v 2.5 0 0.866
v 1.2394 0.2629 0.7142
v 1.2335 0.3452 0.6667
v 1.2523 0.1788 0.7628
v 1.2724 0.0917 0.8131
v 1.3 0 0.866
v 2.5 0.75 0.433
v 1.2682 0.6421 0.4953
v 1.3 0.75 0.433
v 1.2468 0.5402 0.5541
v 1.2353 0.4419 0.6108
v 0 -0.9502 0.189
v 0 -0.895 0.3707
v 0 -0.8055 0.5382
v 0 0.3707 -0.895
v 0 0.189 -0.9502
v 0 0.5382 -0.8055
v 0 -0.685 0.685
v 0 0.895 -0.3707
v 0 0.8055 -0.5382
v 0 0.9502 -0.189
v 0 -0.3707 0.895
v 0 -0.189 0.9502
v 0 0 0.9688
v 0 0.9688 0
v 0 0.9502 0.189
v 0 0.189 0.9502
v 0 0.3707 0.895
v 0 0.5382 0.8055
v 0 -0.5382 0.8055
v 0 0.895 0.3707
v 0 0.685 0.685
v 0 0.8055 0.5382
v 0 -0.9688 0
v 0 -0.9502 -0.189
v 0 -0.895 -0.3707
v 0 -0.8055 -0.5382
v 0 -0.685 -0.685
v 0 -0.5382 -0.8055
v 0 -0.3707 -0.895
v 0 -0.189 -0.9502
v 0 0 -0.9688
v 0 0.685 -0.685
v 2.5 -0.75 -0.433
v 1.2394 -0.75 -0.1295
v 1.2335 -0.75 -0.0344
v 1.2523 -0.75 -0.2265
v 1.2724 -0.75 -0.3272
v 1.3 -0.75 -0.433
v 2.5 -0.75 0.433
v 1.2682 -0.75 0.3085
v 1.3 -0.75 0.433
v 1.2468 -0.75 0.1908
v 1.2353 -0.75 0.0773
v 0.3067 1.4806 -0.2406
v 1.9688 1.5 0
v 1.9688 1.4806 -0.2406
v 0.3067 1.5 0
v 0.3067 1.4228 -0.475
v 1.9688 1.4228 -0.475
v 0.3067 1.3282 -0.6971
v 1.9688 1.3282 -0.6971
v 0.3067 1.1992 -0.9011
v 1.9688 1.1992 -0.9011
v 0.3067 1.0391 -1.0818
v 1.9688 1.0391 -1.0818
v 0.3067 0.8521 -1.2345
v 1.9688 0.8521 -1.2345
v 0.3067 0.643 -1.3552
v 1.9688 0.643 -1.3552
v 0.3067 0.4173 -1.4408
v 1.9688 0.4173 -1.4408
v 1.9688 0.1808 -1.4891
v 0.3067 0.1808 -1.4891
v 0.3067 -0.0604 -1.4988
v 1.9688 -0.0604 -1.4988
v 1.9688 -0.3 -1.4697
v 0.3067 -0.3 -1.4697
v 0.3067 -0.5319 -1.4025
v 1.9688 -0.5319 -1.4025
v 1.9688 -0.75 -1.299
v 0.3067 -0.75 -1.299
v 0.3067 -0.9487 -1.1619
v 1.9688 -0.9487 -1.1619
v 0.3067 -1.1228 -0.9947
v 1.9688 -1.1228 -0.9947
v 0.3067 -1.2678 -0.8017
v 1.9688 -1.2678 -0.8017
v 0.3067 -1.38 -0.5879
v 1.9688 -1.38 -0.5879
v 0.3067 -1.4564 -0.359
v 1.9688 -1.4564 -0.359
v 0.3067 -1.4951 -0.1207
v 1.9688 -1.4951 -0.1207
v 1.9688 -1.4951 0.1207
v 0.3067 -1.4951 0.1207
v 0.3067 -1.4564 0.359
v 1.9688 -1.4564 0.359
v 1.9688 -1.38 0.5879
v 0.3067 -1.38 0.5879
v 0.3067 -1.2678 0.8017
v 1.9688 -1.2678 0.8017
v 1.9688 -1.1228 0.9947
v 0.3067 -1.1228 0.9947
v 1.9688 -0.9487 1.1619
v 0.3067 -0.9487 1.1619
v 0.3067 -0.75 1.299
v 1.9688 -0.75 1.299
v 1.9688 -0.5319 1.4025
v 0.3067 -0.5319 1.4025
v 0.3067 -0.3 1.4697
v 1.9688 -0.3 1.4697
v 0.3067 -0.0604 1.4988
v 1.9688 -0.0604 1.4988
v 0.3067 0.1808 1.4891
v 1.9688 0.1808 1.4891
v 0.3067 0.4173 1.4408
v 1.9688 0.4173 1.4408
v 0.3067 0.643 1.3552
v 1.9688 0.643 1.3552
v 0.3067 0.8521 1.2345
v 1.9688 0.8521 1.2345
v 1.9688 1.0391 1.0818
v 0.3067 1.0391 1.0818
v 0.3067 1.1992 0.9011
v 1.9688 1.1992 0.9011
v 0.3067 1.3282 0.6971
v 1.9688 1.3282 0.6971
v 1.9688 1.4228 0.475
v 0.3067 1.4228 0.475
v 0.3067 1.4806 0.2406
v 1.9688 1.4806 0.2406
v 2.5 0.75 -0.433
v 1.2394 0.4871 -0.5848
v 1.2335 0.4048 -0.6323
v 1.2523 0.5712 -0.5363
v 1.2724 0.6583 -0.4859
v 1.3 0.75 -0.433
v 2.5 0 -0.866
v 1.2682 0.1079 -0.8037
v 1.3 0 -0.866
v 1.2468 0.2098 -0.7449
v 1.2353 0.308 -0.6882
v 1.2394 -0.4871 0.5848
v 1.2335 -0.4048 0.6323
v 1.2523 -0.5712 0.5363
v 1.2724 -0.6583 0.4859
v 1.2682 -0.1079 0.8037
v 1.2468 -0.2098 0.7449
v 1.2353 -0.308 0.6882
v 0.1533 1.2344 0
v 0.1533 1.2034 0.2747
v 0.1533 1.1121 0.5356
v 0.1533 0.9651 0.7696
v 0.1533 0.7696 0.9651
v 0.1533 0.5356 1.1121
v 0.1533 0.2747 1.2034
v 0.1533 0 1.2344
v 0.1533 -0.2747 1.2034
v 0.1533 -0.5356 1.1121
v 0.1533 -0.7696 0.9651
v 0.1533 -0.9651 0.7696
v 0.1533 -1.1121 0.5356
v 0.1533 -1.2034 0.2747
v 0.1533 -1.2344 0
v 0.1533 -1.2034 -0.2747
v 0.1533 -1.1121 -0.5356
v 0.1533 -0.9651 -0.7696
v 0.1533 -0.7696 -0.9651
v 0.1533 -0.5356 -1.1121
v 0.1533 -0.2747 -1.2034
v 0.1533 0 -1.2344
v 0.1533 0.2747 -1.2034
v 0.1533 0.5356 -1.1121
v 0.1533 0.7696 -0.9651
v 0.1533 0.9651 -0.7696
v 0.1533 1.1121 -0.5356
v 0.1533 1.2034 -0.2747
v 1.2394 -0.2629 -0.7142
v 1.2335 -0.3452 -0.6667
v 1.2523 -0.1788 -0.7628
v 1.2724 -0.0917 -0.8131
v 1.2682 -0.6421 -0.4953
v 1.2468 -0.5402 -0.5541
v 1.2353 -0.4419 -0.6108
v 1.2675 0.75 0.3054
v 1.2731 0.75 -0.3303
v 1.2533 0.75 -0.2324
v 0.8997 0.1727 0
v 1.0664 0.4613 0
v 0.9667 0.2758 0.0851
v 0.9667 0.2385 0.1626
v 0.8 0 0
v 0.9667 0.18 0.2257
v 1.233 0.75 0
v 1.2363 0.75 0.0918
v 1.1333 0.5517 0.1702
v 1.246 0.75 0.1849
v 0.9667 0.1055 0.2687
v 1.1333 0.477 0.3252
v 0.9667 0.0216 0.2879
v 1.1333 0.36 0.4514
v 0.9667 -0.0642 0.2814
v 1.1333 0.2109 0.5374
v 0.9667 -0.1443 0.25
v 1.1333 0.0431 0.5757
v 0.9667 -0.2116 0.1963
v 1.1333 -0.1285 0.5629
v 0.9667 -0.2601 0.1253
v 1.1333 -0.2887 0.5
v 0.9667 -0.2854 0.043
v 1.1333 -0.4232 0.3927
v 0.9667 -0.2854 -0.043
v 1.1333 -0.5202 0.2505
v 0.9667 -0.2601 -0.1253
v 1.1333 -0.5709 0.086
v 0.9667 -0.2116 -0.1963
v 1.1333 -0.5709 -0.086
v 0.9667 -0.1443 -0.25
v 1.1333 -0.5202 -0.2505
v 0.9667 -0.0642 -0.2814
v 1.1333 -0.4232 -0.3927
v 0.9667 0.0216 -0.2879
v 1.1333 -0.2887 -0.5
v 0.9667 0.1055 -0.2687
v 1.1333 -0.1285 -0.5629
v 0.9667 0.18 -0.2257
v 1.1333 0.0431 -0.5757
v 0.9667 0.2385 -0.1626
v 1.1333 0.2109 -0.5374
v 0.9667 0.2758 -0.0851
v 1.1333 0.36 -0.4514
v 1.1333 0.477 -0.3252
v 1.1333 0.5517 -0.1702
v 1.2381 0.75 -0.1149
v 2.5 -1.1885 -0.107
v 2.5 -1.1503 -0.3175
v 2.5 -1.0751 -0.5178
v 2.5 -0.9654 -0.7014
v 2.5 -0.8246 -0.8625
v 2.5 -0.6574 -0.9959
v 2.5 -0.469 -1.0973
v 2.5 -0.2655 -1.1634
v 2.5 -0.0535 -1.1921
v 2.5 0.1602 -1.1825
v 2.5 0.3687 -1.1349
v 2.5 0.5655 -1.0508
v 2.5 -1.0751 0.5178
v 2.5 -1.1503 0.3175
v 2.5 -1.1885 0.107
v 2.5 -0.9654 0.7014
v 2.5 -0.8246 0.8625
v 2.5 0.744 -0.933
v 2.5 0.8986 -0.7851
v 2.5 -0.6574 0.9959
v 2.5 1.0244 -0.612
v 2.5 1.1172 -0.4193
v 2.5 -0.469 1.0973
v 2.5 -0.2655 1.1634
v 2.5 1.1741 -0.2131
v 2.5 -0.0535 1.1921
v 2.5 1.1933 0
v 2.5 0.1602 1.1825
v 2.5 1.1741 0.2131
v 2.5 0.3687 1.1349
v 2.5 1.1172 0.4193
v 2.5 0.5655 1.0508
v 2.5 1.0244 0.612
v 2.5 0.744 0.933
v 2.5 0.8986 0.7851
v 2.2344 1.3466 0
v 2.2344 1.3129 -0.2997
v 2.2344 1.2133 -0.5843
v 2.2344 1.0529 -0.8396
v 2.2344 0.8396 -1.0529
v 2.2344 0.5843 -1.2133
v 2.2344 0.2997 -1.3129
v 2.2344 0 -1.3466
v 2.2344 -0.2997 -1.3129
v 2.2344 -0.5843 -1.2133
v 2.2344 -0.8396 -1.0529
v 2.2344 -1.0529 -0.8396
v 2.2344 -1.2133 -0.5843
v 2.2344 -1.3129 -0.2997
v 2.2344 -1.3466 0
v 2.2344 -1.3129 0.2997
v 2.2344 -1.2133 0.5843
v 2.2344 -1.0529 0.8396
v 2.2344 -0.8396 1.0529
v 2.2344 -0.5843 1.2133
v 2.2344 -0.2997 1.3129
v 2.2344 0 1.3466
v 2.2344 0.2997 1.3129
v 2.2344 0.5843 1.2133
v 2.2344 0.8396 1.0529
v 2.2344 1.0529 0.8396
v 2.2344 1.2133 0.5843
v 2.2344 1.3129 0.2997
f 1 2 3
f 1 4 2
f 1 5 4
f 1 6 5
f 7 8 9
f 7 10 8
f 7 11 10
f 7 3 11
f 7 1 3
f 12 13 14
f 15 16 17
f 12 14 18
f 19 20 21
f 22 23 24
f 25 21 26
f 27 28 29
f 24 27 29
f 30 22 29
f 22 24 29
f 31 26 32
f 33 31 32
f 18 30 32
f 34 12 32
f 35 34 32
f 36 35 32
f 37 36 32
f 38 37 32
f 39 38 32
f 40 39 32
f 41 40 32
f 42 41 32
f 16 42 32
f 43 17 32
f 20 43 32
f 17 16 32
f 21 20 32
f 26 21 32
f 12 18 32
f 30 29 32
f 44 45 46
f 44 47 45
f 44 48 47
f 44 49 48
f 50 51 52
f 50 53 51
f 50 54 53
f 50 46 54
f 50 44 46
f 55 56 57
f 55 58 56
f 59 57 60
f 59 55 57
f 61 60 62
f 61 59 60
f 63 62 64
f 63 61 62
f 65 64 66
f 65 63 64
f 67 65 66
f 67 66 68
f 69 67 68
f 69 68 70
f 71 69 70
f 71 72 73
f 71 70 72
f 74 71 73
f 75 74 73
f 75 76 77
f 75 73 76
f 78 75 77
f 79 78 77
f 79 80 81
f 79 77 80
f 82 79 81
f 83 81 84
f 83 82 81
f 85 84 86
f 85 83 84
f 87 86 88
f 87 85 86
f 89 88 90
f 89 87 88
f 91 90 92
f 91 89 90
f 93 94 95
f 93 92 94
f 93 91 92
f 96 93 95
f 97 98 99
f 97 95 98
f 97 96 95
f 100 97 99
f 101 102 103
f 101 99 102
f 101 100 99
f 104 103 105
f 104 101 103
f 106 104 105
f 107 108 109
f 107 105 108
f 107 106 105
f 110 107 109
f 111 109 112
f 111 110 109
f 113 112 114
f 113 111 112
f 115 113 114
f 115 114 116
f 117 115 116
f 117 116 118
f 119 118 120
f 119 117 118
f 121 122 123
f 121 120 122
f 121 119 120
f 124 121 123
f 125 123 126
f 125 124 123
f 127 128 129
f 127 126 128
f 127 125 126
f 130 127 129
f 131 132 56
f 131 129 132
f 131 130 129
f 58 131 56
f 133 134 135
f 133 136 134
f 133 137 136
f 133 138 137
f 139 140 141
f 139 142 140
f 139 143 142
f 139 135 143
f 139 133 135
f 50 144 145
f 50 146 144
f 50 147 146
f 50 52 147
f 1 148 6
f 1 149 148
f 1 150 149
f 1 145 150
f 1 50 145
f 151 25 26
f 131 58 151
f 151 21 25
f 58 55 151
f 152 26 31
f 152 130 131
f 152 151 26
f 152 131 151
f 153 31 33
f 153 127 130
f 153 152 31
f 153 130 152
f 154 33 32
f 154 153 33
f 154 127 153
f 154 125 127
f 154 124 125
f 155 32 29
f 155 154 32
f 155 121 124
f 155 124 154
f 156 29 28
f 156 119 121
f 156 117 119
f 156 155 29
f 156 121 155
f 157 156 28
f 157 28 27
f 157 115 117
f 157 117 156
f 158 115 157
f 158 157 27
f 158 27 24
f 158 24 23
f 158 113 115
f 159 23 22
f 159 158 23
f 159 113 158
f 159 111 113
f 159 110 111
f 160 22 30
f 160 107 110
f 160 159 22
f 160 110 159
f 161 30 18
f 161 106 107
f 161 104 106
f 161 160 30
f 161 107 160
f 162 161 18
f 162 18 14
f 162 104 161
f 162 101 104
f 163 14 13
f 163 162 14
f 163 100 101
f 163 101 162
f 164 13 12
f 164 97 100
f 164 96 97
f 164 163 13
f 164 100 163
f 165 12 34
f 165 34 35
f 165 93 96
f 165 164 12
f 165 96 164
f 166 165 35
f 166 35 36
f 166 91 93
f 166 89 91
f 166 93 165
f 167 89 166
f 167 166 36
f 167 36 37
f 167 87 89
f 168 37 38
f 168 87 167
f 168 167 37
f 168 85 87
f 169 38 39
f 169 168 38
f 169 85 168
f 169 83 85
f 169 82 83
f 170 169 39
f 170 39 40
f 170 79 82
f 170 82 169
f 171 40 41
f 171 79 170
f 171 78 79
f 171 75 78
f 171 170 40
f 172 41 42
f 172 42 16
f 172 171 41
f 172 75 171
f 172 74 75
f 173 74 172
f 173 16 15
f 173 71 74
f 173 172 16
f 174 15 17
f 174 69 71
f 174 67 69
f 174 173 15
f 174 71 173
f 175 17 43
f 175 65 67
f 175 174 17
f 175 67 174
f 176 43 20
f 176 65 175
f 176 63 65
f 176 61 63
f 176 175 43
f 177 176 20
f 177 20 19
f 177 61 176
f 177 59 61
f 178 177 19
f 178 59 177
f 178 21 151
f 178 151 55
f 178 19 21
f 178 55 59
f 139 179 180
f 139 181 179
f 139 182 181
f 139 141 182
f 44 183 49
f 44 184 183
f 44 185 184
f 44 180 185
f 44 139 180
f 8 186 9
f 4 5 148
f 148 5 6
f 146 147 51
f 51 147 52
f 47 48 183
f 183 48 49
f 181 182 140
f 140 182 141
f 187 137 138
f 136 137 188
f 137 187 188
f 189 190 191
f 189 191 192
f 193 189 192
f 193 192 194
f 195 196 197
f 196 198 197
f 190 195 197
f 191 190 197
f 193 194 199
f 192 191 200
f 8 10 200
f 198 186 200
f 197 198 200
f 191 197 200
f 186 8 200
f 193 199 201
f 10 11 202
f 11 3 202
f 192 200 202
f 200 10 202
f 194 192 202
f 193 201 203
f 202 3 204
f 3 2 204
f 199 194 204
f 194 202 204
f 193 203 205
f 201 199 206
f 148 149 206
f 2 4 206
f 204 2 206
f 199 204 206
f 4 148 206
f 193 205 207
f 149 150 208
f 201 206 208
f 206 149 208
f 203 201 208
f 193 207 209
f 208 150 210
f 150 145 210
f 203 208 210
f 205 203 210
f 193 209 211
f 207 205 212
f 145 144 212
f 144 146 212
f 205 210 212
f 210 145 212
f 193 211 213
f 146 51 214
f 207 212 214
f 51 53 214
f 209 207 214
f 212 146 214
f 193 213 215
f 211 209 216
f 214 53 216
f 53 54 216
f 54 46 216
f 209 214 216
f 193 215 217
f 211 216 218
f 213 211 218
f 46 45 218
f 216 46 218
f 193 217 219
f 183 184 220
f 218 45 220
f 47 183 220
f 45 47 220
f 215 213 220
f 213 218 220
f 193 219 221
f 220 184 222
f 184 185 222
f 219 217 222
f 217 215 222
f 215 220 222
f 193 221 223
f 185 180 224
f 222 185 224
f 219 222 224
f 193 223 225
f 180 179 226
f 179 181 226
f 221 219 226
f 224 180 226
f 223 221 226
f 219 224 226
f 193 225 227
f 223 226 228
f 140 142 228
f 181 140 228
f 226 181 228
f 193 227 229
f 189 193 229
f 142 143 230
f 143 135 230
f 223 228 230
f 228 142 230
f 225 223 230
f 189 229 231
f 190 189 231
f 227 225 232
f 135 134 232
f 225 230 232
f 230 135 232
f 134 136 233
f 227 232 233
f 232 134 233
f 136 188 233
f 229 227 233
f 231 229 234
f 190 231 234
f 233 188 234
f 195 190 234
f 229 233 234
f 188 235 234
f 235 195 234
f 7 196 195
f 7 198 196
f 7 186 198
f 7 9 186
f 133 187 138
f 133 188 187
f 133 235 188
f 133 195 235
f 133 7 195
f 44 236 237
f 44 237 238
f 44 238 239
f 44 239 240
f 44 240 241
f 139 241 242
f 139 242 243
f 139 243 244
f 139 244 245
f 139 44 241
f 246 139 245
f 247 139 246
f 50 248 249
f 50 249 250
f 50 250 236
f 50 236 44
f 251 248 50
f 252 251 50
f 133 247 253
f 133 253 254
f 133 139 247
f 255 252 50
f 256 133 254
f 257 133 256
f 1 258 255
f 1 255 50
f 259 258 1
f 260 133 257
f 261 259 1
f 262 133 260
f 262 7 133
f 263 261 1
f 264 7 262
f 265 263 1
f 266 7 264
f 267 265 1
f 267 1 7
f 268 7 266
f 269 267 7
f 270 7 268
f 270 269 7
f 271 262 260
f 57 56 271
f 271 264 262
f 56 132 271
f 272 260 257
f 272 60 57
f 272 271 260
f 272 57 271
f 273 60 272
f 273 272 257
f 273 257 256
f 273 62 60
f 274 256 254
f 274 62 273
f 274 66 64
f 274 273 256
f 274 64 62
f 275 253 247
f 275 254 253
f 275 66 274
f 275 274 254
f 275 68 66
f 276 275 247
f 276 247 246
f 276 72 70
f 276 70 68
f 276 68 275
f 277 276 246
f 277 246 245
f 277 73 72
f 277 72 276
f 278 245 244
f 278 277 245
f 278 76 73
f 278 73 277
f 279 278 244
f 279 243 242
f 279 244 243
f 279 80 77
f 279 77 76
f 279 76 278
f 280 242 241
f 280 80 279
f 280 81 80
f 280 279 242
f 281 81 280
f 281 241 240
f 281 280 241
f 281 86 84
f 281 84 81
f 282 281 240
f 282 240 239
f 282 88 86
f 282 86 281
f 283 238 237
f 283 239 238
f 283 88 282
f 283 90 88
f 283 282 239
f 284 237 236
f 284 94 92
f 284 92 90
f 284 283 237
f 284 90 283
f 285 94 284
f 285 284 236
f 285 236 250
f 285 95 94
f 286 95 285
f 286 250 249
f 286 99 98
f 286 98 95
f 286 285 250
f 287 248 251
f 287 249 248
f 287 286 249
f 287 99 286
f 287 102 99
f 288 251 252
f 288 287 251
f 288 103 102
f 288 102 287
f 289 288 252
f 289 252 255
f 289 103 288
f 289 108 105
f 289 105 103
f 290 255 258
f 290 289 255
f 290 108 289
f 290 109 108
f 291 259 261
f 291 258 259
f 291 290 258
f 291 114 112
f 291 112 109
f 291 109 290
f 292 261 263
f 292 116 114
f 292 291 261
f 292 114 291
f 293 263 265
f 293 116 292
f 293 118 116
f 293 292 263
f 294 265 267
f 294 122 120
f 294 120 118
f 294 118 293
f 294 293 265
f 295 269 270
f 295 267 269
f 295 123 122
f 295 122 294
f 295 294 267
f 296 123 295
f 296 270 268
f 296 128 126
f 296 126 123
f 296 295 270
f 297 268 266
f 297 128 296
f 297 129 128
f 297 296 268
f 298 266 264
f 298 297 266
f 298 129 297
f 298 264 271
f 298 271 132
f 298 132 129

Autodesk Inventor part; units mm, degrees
ref_plane "YZ Plane" through (0, 0, 0) normal (1, 0, 0) x (0, 1, 0)
ref_plane "XZ Plane" through (0, 0, 0) normal (0, 1, 0) x (-1, 0, 0)
sketch "Skizze1" plane through (0, 0, 0) normal (0, 0, 1) x (1, 0, 0)
  line L0 (0, 0) -> (0.8, 0)
  line L1 (2.5, 0.866) -> (2.5, 1.5)
  line L2 (2.5, 1.5) -> (0, 1.5)
  line L3 (2.5, 0.866) -> (1.3, 0.866)
  line L4 (1.3, 0.866) -> (0.8, 0)
  line L5 (0, -0.3) -> (0, 1.8) projected
  line L6 (0, 1.5) -> (0, 0)
  dimension "d0" = 1.2
  dimension "d1" = 60
  dimension "d2" = 3
  dimension "d3" = 1.7321
  dimension "d5" = 2.5
revolve "Körper" add sketch "Skizze1" angle 360 about axis through (0, 0, 0) along (1, 0, 0)
chamfer "Fase1" distance 0.3067 angle 60 1 edges at (2.5, -1.5, 0) measured on face at (2.5, 1.2658, -0.1887)
sketch "Skizze2" plane through (2.5, 0, 0) normal (1, 0, 0) x (0, 0, -1)
  circle A0 centre (0, 0) radius 0.866 projected
  line L0 (-0.433, 0.75) -> (0.433, 0.75)
  line L1 (0.433, 0.75) -> (0.866, 0)
  line L2 (0.866, 0) -> (0.433, -0.75)
  line L3 (0.433, -0.75) -> (-0.433, -0.75)
  line L4 (-0.433, -0.75) -> (-0.866, 0)
  line L5 (-0.866, 0) -> (-0.433, 0.75)
  point P0 (0, 0)
  point P1 (0, 0)
extrude "Loch" add sketch "Skizze2" against normal up to next contours L1 A0 | A0 L2 | L0 A0 | A0 L3 | L5 A0 | A0 L4
thread "Gewinde" size "M3x0.5" class "6g" standard "ISO Metric profile" length 2.5
chamfer "Fase2" distance 0.3067 angle 60 1 edges at (0, -1.5, 0) measured on face at (0.6562, 1.4951, -0.1207)
ref_plane "Work Plane1" through (1.25, 0, 0) normal (0, 0.5, 0.866) x (1, 0, 0)
equation "\"d0\" = INTI"
equation "\"d2\" = NND"
equation "\"d3\" = 1.1547 * SW"
equation "\"d5\" = NLG"
equation "\"d7\" = -0.5 * GD1 + 0.5 * NND"
equation "\"d8\" = FAWI"
equation "\"d29\" = -0.5 * GD1 + 0.5 * NND"
equation "\"d11\" = NLG"
equation "\"d13\" = -0.5 * GD1 + 0.5 * NND"
equation "\"d14\" = FAWI"
equation "\"d30\" = -0.5 * GD1 + 0.5 * NND"
equation "\"NND\" = 3"
equation "\"NLG\" = 2.5"
equation "\"INTI\" = 1.2"
equation "\"FAWI\" = 60deg"
equation "\"SW\" = 1.5"
equation "\"GD1\" = THREADDIA - 1.2269 * PTC"
equation "\"FAWI1\" = 45deg"
equation "\"GUL\" = 0.61345 * PTC"
equation "\"SPD\" = 2"
equation "\"TOA\" = 30deg"
equation "\"THREADDIA\" = 3"
equation "\"PTC\" = 0.5"
equation "\"GAL\" = 0.61345 * PTC"
equation "\"E0\" = 1.155 * SW"
properties part number "BS 4168 - M3 x 2,5" material "Steel, Mild"
